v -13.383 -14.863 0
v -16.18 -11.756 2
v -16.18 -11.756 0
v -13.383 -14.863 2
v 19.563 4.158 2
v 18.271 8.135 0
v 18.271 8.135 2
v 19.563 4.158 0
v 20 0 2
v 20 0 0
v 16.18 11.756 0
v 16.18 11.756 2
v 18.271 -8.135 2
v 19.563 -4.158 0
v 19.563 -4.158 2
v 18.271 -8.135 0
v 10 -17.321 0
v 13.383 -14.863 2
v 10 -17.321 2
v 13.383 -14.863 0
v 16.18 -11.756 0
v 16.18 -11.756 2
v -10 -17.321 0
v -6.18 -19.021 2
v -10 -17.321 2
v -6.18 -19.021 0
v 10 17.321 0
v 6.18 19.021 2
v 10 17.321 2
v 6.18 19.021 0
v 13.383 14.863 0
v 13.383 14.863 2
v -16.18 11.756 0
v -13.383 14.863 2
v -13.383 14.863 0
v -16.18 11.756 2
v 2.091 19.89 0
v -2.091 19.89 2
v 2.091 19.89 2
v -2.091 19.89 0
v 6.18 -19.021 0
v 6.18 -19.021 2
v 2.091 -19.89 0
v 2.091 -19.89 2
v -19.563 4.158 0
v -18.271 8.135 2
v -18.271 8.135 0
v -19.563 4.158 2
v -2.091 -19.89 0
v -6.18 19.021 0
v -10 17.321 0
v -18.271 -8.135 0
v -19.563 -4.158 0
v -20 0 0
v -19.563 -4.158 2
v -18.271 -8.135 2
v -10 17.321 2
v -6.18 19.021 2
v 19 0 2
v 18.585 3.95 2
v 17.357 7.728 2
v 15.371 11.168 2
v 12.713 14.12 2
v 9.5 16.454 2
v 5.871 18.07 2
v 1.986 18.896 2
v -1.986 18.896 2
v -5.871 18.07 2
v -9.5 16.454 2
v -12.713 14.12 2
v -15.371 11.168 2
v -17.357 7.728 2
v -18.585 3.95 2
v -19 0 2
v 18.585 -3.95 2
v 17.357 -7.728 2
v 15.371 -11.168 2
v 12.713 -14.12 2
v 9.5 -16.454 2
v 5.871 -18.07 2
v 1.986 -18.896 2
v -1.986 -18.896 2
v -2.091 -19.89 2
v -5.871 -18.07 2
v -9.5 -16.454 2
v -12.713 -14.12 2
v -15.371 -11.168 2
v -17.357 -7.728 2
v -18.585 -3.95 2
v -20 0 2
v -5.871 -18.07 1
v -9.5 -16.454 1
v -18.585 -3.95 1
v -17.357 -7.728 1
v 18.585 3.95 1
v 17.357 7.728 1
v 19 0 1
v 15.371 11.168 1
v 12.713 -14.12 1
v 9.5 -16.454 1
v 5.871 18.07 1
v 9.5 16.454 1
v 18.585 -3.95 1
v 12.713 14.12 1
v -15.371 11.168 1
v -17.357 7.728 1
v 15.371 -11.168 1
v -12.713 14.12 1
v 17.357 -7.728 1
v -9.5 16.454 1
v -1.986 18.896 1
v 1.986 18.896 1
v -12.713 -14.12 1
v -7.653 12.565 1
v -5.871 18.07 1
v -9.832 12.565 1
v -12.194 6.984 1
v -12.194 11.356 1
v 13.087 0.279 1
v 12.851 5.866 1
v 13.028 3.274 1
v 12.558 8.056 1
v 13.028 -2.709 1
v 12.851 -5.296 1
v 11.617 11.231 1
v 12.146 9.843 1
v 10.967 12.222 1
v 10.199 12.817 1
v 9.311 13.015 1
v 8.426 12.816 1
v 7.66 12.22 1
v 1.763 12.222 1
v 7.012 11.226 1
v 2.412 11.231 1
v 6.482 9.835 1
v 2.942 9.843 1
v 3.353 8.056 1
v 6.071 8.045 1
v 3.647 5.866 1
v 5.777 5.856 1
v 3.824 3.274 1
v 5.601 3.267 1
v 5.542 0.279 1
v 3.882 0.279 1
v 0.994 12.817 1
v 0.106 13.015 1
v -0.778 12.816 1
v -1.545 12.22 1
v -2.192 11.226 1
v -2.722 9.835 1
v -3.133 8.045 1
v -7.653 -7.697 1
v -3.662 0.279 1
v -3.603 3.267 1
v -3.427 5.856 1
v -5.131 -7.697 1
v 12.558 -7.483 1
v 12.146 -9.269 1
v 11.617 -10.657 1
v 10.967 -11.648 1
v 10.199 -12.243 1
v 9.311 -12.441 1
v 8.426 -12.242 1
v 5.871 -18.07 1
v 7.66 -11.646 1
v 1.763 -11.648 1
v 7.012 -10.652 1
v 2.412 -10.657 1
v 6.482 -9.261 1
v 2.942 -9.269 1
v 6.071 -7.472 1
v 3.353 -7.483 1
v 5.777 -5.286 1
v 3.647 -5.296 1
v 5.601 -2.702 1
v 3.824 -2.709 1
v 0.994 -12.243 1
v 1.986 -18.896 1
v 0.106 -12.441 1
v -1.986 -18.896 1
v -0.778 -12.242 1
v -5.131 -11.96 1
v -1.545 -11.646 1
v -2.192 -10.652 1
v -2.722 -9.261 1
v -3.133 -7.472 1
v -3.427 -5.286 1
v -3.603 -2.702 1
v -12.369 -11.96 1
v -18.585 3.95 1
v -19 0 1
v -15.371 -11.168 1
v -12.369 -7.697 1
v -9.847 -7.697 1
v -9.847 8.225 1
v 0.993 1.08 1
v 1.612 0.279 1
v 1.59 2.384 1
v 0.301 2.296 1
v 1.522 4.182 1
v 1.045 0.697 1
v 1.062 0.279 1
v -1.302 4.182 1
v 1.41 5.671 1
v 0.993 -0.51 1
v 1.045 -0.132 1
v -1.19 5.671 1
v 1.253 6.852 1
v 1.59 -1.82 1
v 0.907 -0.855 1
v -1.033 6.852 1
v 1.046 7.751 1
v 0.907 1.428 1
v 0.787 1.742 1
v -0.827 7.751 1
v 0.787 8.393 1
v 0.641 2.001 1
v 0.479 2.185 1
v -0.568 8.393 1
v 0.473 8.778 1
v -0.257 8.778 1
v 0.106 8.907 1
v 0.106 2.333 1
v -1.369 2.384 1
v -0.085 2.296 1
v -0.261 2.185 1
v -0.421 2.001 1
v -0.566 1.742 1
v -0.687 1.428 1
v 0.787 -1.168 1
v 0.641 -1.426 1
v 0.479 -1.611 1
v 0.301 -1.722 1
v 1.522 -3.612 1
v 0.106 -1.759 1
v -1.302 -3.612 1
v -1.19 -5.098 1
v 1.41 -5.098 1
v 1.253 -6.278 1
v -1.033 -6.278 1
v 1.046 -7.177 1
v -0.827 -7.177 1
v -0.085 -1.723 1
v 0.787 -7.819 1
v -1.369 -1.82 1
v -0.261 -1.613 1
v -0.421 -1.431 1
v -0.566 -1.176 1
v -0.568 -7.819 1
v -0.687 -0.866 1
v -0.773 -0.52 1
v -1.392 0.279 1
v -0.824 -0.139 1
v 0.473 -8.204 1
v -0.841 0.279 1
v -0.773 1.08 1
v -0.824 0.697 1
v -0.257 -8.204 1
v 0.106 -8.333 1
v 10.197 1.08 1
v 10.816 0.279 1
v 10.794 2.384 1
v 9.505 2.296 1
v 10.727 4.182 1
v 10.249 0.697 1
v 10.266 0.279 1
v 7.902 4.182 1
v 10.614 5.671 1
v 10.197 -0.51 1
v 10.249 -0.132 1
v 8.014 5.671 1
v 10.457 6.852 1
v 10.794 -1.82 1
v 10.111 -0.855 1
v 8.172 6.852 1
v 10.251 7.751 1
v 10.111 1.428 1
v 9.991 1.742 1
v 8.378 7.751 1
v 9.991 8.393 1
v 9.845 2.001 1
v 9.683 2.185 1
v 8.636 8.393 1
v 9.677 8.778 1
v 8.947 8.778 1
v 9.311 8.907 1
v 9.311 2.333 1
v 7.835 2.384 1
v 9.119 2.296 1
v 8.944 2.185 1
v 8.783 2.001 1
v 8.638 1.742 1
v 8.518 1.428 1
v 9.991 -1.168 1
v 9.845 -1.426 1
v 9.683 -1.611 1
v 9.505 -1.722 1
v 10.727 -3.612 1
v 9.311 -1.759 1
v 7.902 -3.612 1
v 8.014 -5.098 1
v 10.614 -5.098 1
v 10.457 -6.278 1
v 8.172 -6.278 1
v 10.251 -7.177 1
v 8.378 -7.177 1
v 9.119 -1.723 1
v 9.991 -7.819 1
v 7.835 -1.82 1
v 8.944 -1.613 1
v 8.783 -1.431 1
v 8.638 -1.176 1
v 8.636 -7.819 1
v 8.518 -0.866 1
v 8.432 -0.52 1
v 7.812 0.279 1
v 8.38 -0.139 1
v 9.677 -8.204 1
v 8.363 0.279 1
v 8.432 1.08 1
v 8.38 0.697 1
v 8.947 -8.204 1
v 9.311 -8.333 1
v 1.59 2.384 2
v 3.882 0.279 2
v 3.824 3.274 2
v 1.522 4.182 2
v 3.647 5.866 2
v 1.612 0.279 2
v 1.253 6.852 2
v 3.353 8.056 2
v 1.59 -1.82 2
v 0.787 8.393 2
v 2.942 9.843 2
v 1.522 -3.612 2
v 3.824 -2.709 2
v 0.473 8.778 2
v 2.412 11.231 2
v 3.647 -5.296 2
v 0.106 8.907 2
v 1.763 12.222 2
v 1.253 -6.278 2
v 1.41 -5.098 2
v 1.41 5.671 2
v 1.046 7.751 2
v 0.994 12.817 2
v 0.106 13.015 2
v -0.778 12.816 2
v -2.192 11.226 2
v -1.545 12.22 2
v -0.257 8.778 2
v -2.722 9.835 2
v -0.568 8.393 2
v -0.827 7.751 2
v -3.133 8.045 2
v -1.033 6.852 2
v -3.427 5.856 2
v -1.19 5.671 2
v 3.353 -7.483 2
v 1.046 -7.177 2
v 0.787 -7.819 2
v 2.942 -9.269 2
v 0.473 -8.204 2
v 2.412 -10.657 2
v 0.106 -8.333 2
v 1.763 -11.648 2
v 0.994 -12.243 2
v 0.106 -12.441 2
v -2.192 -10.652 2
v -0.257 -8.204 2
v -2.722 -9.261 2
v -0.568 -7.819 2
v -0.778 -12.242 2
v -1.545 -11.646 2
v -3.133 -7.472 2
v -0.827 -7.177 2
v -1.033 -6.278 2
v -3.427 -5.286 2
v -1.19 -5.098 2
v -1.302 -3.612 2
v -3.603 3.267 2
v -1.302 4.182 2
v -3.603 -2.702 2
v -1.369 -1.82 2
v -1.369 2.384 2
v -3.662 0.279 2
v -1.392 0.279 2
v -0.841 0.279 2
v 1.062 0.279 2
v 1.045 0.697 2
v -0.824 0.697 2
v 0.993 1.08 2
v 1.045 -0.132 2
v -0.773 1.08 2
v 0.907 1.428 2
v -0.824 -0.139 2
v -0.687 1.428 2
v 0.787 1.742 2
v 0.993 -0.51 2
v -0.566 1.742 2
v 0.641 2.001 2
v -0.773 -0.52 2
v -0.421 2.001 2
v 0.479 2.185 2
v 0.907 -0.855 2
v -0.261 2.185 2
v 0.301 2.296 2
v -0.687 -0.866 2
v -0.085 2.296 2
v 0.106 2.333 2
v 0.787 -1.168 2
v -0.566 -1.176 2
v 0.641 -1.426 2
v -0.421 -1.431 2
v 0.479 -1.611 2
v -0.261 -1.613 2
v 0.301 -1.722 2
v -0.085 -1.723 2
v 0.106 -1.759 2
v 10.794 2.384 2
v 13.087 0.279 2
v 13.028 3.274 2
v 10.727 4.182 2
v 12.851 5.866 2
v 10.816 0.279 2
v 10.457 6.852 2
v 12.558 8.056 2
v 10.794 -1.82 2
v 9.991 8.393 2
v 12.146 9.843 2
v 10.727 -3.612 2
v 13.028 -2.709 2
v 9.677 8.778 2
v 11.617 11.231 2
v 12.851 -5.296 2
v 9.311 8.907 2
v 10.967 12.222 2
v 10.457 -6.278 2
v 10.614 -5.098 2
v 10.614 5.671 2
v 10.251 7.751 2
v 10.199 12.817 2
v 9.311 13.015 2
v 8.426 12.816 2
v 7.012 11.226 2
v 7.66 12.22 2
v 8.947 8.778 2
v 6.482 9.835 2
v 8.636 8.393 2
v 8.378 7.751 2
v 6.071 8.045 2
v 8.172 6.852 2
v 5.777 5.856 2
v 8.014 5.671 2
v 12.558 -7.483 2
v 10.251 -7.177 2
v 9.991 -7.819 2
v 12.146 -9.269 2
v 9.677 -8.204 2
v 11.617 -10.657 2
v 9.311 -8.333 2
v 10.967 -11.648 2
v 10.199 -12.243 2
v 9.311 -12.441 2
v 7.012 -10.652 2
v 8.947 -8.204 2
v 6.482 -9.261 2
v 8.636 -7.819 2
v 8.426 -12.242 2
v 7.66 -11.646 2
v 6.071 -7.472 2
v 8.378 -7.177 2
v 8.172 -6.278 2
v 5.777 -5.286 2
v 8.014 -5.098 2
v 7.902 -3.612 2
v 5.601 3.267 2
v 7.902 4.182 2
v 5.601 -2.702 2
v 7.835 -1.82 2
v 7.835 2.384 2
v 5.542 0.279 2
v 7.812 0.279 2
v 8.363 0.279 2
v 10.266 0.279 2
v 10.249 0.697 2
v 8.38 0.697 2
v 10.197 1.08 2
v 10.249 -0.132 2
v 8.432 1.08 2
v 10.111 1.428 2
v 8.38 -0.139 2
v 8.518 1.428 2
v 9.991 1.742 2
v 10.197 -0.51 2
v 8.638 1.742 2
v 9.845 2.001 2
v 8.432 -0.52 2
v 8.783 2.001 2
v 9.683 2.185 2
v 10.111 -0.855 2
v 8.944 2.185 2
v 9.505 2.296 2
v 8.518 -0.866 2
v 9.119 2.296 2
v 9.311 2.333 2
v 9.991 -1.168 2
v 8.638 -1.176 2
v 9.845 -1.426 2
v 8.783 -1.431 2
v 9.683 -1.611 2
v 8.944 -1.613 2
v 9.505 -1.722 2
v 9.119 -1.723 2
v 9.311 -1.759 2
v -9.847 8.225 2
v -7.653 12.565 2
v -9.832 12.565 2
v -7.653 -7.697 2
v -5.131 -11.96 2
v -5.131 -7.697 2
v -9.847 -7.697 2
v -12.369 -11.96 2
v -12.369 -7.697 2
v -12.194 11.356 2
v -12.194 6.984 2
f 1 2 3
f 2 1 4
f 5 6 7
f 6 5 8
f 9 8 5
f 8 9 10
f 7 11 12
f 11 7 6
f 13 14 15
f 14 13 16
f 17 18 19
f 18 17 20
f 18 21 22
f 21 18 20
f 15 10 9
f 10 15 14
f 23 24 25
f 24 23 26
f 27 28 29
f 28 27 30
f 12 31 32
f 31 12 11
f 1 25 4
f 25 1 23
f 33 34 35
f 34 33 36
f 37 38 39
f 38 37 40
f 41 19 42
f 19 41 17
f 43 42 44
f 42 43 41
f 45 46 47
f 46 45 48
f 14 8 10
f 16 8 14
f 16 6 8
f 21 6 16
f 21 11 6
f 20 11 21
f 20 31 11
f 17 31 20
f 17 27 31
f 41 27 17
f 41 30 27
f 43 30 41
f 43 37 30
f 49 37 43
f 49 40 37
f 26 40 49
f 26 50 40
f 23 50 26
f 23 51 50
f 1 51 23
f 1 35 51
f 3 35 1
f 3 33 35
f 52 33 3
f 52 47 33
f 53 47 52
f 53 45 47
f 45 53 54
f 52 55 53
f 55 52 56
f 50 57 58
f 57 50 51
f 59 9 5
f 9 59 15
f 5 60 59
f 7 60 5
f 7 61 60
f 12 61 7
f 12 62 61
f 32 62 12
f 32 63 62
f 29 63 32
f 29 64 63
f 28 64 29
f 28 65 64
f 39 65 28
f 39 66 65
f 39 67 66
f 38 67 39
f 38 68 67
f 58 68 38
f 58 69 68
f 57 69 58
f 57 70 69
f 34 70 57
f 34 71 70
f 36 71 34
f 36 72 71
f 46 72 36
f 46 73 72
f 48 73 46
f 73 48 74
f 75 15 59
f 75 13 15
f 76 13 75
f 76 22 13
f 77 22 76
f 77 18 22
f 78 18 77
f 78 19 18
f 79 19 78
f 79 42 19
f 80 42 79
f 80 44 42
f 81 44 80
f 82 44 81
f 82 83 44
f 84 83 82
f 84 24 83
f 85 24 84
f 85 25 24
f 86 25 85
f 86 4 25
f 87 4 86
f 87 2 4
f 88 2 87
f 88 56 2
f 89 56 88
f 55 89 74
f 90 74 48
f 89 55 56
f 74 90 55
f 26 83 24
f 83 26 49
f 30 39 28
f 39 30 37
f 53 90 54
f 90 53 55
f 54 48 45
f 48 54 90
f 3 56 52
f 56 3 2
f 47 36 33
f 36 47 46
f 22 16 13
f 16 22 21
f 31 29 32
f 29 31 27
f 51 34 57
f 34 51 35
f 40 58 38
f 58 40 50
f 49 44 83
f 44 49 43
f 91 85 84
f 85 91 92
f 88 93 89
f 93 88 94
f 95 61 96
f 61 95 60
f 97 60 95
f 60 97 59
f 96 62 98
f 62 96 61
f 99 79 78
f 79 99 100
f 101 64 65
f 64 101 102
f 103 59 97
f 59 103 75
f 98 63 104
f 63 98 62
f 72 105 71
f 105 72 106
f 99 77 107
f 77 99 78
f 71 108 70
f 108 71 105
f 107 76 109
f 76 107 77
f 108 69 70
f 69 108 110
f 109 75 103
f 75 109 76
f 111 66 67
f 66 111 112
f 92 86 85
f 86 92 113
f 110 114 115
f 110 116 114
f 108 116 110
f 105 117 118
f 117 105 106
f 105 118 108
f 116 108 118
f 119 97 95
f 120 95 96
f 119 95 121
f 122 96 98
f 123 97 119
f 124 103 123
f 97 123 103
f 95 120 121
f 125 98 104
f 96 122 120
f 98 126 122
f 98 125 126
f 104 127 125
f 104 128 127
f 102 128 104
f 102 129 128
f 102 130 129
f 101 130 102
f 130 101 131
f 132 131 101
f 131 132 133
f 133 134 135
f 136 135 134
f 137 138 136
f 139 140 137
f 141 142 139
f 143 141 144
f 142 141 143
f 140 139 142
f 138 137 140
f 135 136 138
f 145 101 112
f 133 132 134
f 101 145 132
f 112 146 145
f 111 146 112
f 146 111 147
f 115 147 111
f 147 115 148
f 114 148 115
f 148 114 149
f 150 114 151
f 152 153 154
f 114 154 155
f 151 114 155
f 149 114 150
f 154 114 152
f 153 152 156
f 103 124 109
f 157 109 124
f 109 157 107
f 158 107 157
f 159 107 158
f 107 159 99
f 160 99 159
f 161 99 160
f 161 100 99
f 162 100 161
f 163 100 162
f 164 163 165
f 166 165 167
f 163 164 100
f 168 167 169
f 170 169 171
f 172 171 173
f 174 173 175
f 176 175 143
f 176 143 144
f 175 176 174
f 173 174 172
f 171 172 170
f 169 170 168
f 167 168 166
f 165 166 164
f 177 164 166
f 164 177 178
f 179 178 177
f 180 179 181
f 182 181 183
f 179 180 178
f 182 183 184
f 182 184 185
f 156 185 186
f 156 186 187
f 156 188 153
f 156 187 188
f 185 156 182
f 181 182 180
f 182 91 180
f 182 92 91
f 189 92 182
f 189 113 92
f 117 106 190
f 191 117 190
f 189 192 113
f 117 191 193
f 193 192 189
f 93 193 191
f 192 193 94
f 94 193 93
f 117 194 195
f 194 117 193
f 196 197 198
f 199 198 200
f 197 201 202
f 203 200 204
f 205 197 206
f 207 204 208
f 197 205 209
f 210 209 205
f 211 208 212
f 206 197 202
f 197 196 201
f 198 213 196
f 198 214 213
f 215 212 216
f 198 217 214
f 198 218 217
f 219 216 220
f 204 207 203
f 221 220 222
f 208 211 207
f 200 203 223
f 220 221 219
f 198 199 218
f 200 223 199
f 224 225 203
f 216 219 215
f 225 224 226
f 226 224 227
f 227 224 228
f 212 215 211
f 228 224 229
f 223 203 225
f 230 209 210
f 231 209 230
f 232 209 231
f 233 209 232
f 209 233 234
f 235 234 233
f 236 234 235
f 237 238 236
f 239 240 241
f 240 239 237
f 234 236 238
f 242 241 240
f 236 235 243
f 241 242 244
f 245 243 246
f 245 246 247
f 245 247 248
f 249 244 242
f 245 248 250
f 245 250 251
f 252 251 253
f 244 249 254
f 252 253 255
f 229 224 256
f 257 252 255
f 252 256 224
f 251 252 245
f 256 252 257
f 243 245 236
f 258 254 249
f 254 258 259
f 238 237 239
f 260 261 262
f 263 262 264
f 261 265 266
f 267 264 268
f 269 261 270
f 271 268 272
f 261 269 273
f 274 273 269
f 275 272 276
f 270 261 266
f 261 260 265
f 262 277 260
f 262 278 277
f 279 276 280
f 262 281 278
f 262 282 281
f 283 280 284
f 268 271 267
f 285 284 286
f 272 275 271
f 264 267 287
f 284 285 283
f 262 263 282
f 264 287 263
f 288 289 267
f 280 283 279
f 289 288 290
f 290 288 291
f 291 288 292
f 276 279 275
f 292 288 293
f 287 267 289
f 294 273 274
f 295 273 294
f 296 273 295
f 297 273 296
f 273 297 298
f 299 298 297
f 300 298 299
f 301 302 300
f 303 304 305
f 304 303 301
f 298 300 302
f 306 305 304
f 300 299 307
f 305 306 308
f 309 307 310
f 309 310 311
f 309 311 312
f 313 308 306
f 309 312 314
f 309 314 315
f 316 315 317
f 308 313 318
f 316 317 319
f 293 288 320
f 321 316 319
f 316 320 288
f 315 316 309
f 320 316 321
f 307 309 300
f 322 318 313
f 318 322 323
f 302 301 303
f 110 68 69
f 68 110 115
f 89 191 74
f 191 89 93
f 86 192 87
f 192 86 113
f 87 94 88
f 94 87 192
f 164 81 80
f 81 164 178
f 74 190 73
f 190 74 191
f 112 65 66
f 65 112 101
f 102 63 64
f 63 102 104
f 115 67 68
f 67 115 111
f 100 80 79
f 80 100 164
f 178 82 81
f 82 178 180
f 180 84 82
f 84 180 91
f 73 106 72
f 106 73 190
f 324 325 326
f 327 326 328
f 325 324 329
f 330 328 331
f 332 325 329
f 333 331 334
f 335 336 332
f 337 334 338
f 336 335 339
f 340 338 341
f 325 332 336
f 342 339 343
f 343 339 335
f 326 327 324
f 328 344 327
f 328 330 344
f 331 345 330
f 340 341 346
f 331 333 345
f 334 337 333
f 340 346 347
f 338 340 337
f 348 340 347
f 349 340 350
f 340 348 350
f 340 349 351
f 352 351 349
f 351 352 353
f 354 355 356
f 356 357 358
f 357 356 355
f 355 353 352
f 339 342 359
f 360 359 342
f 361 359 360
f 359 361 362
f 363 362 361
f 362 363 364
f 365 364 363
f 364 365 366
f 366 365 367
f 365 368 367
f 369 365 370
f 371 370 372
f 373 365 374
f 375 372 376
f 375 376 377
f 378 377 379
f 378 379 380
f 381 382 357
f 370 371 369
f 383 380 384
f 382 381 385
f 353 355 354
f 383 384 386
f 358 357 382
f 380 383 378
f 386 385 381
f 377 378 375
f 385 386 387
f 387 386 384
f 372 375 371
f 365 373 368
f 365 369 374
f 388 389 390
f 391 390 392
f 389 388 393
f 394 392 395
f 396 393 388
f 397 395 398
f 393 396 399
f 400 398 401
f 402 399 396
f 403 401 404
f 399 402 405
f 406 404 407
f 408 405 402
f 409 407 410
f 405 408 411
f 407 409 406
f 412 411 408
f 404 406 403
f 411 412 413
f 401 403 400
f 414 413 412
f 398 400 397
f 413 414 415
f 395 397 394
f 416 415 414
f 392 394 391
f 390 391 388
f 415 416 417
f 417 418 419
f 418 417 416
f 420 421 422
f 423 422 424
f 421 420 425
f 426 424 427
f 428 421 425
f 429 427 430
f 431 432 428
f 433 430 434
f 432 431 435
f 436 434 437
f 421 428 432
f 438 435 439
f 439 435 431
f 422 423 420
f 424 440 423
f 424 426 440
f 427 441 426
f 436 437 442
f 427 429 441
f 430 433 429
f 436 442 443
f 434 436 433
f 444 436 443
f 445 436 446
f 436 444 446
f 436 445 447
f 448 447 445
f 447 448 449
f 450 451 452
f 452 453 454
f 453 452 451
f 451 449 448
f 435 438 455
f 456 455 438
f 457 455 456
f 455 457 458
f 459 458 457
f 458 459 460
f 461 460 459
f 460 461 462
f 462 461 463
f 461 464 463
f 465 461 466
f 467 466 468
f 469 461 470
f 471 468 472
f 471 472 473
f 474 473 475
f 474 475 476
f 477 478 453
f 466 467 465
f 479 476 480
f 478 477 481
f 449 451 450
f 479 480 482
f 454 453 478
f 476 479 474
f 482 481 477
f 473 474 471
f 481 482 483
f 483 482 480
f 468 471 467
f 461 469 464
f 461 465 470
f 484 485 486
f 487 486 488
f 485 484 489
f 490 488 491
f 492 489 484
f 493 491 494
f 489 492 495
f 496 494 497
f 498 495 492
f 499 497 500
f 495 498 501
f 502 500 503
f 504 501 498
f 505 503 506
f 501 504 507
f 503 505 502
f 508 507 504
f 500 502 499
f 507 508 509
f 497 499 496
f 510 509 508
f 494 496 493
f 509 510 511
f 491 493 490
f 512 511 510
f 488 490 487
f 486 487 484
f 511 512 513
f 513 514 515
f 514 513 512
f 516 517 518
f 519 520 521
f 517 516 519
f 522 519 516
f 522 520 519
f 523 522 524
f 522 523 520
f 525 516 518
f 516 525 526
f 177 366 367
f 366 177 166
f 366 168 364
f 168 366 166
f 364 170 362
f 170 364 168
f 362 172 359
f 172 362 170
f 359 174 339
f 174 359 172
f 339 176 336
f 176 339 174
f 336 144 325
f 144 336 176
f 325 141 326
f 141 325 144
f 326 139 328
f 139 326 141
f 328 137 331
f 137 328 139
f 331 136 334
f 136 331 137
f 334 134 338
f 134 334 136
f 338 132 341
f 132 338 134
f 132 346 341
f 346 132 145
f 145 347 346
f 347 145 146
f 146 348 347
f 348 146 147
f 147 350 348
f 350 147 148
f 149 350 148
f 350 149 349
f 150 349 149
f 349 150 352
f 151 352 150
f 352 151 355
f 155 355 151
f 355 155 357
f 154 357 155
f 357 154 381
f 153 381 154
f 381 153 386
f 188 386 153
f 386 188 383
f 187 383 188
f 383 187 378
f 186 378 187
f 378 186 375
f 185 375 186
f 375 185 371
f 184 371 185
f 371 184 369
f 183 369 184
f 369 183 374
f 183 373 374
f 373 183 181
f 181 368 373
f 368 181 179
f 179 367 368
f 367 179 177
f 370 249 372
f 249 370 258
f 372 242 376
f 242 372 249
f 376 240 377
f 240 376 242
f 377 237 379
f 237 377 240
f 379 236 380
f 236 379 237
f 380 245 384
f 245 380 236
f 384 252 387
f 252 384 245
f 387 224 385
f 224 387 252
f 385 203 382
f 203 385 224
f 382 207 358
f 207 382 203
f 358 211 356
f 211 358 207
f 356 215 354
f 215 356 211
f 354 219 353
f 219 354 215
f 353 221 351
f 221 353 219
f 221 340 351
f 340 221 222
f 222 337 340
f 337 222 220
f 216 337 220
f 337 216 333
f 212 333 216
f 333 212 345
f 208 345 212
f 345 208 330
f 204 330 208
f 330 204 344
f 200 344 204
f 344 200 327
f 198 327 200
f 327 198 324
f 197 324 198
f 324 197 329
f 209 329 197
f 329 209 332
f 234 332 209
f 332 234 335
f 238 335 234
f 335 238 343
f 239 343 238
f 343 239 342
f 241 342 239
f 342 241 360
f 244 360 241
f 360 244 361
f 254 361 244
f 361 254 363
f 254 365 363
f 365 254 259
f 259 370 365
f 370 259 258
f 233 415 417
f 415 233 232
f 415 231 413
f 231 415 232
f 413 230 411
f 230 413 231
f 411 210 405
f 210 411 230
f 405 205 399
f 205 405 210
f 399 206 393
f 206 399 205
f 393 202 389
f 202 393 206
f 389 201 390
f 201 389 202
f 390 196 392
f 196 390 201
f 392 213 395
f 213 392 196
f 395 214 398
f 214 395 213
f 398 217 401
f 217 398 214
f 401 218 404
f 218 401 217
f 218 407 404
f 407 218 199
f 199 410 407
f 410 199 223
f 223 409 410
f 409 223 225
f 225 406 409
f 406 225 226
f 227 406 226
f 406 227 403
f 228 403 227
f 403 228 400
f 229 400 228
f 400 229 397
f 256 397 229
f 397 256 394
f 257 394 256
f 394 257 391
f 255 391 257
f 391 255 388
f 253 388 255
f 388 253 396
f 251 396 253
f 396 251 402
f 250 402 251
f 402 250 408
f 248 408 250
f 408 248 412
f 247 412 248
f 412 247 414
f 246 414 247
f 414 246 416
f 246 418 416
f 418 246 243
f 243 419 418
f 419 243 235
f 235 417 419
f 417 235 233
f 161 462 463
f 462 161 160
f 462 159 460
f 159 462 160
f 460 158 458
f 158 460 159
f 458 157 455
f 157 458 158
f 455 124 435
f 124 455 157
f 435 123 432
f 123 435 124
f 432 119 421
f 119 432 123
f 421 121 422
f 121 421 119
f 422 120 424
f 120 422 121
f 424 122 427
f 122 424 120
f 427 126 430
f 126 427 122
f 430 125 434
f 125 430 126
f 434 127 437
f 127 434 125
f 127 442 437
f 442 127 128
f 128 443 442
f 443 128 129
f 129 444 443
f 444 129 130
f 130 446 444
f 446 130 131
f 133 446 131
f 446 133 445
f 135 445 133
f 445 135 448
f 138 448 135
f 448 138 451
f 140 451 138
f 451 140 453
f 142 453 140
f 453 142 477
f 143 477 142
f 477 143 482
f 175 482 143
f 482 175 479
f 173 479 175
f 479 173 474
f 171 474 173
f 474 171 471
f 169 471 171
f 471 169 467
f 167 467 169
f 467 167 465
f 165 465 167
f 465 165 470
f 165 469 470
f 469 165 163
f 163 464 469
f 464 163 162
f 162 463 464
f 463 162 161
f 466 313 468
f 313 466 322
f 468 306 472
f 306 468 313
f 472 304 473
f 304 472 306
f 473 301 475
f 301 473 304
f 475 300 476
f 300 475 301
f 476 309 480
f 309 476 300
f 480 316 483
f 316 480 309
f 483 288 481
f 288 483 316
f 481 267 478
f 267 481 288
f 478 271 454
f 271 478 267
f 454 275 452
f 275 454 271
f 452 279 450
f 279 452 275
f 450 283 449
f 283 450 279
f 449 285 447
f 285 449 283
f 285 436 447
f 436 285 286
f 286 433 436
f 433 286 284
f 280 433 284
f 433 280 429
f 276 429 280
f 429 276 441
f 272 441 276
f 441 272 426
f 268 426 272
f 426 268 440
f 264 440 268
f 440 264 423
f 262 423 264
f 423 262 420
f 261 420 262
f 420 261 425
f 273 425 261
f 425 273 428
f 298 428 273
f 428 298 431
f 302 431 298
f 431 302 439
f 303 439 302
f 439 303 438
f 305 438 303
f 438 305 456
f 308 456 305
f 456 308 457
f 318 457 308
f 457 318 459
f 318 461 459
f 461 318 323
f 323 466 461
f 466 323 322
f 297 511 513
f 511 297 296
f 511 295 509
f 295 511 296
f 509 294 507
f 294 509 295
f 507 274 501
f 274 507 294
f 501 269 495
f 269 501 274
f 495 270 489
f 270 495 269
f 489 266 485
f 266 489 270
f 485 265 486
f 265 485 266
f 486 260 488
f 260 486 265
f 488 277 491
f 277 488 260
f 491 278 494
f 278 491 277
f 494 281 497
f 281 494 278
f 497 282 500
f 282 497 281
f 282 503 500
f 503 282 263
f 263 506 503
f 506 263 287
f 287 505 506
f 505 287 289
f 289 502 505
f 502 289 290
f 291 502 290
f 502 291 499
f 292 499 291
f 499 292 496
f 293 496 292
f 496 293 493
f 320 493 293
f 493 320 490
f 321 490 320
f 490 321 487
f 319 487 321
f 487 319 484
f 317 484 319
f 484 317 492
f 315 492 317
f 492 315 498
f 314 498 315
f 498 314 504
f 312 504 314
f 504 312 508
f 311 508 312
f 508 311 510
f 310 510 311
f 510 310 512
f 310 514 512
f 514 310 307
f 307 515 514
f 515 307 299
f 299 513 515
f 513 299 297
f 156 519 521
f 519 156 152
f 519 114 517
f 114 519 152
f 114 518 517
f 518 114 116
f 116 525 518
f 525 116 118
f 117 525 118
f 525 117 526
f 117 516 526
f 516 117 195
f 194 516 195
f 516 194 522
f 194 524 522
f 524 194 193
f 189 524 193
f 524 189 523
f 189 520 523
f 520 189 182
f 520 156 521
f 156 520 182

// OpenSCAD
/*
 *  Number counters for Magic: the Gathering
 */

/* [Value] */

value = "100";

/* [Dimensions] */

radius                  = 20.0; // [0.1:0.1:100.0]
base_thickness          = 1.0;  // [0.1:0.1:100.0]
base_frame_thickness    = 1.0;  // [0.0:0.1:100.0]
label_margin            = 1.0;  // [0.1:0.1:100.0]
label_bump_height       = 1.0;  // [0.1:0.1:100.0]

/* [Hidden] */

base_plate_total_thickness = base_frame_thickness > 0.0
                           ? base_thickness + label_bump_height
                           : base_thickness;
base_plate_dim = [radius, radius, base_plate_total_thickness];

label_padding = base_frame_thickness + label_margin;
label_radius = radius - base_frame_thickness;

label_thickness = base_thickness + label_bump_height;
label_edge_len = sqrt(2) * (label_radius - label_margin);
label_dim = [label_edge_len, label_edge_len, label_thickness];

module base_plate() {
    difference() {
        cylinder(base_plate_total_thickness, radius, radius);
        translate([0.0, 0.0, base_plate_total_thickness-label_bump_height]) {
            cylinder(label_bump_height, label_radius, label_radius);
        }
    }
}

module label_text(str) {
    resize(label_dim) {
        linear_extrude(label_thickness) {
            text(str, 10, "FreeMono:style=Bold", halign="center", valign="center");
        }
    }
}

module number_counter(str) {
    base_plate();
    translate([0.0, 0.0, 0.0]) {
        label_text(str);
    }
}

number_counter(value);
